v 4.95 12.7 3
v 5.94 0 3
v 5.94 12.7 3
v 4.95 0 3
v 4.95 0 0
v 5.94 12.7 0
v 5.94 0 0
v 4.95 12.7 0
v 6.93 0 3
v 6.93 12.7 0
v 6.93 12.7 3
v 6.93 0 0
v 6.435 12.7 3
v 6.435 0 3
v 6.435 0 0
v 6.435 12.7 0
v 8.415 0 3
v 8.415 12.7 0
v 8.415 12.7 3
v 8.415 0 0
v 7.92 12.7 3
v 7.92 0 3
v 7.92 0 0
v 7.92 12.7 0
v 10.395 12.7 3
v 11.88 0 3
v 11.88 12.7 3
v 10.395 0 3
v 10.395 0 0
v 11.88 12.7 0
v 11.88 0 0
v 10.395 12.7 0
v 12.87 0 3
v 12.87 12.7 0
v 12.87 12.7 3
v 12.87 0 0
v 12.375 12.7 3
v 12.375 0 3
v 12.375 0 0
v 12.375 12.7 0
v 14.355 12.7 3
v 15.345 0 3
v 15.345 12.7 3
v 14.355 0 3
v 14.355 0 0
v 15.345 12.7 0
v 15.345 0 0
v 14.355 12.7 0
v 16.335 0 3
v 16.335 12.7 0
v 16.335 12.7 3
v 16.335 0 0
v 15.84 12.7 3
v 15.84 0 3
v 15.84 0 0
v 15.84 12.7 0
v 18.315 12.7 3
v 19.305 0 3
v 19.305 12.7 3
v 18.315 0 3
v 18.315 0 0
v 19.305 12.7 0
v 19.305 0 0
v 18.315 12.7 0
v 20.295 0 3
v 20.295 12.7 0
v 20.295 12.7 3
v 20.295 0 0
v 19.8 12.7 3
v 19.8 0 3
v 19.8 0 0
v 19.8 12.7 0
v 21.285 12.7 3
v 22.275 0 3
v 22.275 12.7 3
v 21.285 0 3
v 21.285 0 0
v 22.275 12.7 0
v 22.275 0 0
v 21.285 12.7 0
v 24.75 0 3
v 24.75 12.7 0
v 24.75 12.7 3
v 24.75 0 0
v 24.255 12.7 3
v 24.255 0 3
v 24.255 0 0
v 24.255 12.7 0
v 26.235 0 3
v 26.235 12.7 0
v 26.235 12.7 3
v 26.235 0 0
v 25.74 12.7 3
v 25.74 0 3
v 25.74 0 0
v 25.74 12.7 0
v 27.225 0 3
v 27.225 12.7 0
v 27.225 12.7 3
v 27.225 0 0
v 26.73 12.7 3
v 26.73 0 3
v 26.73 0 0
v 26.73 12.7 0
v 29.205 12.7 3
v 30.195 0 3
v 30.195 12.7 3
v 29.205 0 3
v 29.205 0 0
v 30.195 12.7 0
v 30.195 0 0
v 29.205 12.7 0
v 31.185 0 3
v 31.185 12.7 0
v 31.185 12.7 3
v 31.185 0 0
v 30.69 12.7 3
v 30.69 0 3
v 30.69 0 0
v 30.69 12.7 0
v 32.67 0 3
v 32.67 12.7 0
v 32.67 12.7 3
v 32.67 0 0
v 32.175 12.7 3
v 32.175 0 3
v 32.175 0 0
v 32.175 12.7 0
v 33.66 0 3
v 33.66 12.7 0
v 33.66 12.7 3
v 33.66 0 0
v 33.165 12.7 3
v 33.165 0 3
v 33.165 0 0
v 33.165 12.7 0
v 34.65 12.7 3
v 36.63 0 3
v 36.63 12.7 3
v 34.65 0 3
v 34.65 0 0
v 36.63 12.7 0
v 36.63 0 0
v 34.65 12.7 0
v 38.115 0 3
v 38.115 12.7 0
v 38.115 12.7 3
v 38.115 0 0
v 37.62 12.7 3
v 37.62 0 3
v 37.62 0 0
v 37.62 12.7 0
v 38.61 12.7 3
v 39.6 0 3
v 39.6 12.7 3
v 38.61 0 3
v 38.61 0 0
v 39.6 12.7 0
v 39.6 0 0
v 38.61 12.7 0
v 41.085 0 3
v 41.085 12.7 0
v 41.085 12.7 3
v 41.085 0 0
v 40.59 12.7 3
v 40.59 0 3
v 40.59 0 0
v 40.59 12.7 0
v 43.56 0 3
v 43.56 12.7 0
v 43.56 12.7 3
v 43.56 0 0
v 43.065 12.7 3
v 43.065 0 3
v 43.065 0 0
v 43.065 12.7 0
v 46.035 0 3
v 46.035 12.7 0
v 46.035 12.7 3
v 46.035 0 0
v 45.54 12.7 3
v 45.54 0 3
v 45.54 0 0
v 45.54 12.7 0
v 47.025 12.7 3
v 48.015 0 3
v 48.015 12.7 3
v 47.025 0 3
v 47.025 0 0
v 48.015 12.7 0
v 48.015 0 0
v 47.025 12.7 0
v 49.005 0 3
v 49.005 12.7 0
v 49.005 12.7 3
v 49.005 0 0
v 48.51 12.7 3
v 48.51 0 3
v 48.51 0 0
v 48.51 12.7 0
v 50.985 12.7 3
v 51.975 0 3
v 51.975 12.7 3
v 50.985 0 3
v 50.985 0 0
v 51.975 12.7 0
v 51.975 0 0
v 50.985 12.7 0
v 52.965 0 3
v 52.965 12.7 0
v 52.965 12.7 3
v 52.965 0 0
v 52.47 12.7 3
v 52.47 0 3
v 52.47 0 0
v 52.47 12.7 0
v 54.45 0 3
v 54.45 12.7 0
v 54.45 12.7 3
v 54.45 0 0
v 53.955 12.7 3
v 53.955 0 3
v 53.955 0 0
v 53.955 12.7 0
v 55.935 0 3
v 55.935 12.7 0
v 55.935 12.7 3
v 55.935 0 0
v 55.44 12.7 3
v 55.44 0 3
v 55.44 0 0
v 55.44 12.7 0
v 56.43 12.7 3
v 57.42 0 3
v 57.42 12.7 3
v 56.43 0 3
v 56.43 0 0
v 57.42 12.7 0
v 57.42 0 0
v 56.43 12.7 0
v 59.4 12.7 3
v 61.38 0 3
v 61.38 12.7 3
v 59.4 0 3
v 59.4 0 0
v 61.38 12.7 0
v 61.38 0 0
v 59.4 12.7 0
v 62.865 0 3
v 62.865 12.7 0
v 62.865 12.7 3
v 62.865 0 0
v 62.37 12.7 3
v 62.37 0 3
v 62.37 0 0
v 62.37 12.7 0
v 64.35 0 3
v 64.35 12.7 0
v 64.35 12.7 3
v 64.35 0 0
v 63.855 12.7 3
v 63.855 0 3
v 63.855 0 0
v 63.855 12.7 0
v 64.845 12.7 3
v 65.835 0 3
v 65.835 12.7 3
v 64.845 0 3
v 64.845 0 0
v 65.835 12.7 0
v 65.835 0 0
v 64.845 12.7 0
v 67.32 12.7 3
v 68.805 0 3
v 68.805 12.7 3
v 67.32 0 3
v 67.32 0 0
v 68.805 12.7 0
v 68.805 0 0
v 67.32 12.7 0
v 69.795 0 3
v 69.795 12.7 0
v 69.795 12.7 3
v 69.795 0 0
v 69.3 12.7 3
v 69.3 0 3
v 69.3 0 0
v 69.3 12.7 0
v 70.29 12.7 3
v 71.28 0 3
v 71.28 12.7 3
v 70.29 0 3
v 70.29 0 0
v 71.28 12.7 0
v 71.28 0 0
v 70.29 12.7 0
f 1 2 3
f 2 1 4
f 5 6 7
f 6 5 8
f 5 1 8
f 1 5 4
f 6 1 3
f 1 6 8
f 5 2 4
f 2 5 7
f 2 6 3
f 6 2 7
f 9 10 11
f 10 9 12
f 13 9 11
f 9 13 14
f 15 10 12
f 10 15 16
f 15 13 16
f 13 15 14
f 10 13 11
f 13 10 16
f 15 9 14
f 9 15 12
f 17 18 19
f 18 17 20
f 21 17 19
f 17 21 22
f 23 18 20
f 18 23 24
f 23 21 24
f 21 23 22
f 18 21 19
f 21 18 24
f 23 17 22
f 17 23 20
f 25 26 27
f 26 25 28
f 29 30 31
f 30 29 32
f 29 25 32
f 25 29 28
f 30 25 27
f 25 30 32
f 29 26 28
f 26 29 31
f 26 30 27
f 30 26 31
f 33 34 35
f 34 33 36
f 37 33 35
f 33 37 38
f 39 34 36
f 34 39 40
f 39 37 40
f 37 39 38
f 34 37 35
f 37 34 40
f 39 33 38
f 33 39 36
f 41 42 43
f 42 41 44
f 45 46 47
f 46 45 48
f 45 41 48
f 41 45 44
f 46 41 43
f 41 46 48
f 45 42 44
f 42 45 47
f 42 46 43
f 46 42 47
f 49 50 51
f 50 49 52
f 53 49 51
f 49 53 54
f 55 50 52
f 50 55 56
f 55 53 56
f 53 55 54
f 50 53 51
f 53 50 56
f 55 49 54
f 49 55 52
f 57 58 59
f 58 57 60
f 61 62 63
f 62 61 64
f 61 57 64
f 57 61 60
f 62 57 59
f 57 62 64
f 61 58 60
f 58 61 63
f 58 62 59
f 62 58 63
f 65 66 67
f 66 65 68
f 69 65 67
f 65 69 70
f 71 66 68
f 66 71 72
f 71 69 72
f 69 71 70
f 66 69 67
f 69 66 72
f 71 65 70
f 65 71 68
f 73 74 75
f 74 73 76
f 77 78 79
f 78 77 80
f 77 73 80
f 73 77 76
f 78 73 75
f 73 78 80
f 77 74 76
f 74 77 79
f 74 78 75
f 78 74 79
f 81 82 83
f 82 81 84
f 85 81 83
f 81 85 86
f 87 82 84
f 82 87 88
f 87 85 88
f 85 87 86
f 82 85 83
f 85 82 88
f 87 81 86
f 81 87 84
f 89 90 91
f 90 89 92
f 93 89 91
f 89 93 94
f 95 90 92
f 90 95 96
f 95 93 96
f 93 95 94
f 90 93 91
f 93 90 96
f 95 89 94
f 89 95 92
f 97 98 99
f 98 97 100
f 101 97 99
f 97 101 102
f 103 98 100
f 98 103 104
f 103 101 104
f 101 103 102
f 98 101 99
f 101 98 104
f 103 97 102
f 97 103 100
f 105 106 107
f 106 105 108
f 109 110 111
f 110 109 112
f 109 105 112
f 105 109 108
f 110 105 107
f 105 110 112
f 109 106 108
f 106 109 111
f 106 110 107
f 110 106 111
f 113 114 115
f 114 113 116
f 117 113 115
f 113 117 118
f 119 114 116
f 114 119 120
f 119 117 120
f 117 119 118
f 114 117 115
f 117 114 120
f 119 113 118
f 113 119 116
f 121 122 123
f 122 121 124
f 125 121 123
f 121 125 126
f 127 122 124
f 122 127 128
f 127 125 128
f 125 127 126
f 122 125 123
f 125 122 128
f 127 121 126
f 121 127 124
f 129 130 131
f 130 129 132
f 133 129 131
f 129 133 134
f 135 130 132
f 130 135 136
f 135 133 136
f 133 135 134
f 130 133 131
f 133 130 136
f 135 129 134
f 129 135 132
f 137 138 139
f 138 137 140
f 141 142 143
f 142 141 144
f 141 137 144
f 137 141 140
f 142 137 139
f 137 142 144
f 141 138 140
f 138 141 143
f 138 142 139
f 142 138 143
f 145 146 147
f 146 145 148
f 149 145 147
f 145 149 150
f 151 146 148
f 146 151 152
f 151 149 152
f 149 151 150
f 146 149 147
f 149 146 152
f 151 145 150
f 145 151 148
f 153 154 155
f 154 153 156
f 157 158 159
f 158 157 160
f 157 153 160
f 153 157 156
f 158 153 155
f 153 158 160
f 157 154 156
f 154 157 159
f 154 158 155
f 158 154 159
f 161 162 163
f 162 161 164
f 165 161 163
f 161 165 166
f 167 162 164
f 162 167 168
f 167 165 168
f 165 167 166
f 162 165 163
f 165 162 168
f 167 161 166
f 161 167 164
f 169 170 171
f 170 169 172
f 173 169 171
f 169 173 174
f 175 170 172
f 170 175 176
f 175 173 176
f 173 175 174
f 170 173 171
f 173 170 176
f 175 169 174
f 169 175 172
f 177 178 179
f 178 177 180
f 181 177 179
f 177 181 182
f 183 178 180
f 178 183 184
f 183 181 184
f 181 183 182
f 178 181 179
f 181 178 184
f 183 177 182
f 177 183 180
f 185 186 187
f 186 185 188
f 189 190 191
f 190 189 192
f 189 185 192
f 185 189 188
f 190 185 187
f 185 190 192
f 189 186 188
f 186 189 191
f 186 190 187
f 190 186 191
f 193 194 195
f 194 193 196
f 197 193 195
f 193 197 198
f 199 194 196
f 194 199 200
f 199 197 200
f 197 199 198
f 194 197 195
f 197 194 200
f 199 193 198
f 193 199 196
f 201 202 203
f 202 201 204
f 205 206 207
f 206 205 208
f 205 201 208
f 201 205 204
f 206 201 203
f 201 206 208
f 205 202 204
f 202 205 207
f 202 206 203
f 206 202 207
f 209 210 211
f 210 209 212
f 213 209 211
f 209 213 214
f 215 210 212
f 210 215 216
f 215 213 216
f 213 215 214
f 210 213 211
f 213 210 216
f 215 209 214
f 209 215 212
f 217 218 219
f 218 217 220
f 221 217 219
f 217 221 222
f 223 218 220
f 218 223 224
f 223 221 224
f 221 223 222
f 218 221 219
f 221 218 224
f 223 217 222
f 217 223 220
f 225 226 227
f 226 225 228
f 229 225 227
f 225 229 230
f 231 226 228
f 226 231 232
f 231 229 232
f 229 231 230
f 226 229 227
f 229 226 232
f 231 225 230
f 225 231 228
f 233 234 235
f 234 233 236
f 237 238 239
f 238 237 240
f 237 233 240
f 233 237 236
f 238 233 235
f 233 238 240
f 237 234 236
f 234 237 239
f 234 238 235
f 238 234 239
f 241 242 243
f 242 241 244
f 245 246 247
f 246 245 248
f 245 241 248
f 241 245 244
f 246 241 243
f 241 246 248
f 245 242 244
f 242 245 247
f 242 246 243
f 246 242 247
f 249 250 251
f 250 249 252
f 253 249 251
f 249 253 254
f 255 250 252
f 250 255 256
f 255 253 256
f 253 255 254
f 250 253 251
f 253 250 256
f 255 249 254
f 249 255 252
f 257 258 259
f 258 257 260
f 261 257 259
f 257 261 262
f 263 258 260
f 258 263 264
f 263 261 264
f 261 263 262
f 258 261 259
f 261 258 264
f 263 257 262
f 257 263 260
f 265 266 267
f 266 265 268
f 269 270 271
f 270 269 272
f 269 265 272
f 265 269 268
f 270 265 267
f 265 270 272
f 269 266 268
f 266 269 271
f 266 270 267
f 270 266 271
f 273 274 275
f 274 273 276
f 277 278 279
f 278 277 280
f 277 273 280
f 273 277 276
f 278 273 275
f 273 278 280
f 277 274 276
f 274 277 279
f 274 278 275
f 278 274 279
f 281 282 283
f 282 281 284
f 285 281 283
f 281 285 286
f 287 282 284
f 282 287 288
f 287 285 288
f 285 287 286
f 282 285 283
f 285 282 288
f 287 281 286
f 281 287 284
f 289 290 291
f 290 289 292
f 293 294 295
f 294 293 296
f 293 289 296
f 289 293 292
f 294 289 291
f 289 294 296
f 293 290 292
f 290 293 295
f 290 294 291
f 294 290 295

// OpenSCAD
// file: ../../util/bitmap.scad
/*****************************************************************************
 * Module Bitmap Library
 * Modules to create bitmaps of unit squares from 1 or 2 dimensional vectors.
 *****************************************************************************
 * Copyright 2017 Chris Baker
 *
 * This program is free software: you can redistribute it and/or modify
 * it under the terms of the GNU Lesser General Public License as published by
 * the Free Software Foundation, either version 3 of the License, or
 * (at your option) any later version.
 *
 * This program is distributed in the hope that it will be useful,
 * but WITHOUT ANY WARRANTY; without even the implied warranty of
 * MERCHANTABILITY or FITNESS FOR A PARTICULAR PURPOSE.  See the
 * GNU Lesser General Public License for more details.
 *
 * You should have received a copy of the GNU Lesser General Public License
 * along with this program.  If not, see <http://www.gnu.org/licenses/>.
 *****************************************************************************
 * Usage:
 * Include this file with the "use" tag.
 * Depends on compat.scad library.
 *
 * API:
 *   1dbitmap(bitmap, center, expansion, vector_mode)
 *   2dbitmap(bitmap, center, expansion, vector_mode)
 *     Generate a 1 or 2-Dimensional field of modules based on the provided
 *     bitmap vector. See Bitmap Vectors below.
 *     The center flag determines whether to center the bitmap on the origin.
 *     The expansion value actually shrinks each cube in the x and y
 *     dimension by the specified amount.
 *     The vector_mode flag determines whether to create 3D solid geometry
 *     (unit cubes) or 2D vector geometry (squares).
 *
 * Bitmap Vectors:
 *   The bitmap vectors primarily provide boolean information.
 *   A module will be placed where these vectors have a postive value and
 *   skipped where they have a negative value. I.E. 0, -1, false, and undef
 *   are all equivalent and result in a skip. 1 and true are equivalent and
 *   result in a placed 1-unit module.
 *   Further, if the value is an integer it will be treated as a height for
 *   the module, allowing z-maps to be created.
 *   If the value is not an integer or boolean, it will be treated as a color
 *   reference. This can be a string or RGBA vector that will be used to
 *   color the module in the OpenSCAD preview window.
 *   In current versions of OpenSCAD, the color has no effect in the rendered
 *   view or STL output.
 *
 * Vector Mode:
 *   Although OpenSCAD supports generating 2D geometry, there are several
 *   caveats:
 *   - 2D and 3D geometry cannot be mixed
 *   - Extruding 2D geometry causes color information to be lost
 *   - All 2D geometry is projected onto the XY plane when rendering
 *   - Rendering also results in loss of color (same as 3D)
 *   - The SVG exporter is somewhat limited:
 *     - The pixel size of the image is hard-coded in the file
 *     - The title of the image is a generic string
 *     - The color selection for stroke and fill is fixed
 *     - The stroke-width is set to a large value that will cause overlap
 *     - The background is transparent
 *     - Only one path element is created with all of the geometry; there is
 *       no easy way to split up the geometry into multiple logical units.
 *     - These issues can mostly be resolved by hand-editing the file:
 *       - Remove or modify the width and height parameters from the svg
 *         element at the top of the file to provide better scaling.
 *       - Edit the title element at the top of the file to change the title.
 *       - Edit the stroke and fill parameters of the path element (these will
 *         probably be at the end of the file).
 *       - Set the stroke-width parameter for the path element to 0.
 *****************************************************************************/
use <compat.scad>

/*
 * 2dbitmap - Turn a 2D vector into a bitmap of cubes
 *
 * bitmap - 2D vector representing where to place each cube
 *          Value can either be boolean, z-height, or color
 * center - center cubes around the origin
 * expansion - size of gap around each pixel (screendoor)
 * vector_mode - create a 2D vector drawing instead of 3D extrusion
 */
module 2dbitmap(bitmap=[[1,0],[0,1]], center=false, expansion=0, vector_mode=false)
{
	ylen=len(bitmap)-1;

	for (y=[0:ylen]) {
		xlen=len(bitmap[y])-1;
		for (x=[0:xlen])
			translate([x-(center?xlen/2:0),ylen-y-(center?ylen/2:0),0])
				if (is_indexable(bitmap[y][x]))
					color(bitmap[y][x])
						if (vector_mode)
							square([1-expansion,1-expansion], center=center);
						else
							cube([1-expansion,1-expansion,1], center=center);
				else
					if (bitmap[y][x])
						if (vector_mode)
							square([1-expansion,1-expansion], center=center);
						else
							cube([1-expansion,1-expansion,clamp_nonnum(bitmap[y][x])], center=center);
	}
}

module 1dbitmap(bitmap=[1,0,1,0,1], center=false, expansion=0, vector_mode=false)
	2dbitmap([bitmap], center, expansion, vector_mode);

/*
 * Examples
 */

// 1D with z-height
translate([10,0,0]) scale([1,10,1])
	1dbitmap(bitmap=[1,1,0,2,0,0,3], expansion=.1);

// 1D with boolean
translate([-20,0,0]) scale([1,10,1])
	1dbitmap(bitmap=[true,false,true,false,true,true]);

// 2D with z-height
scale([2,2,1])
	2dbitmap(bitmap=[[1,0,2,1],[0,3,3,0],[1,1,0,1]],
		center=true);

// 1D with color
translate([0,-10,0]) scale([1,3,1])
	1dbitmap(bitmap=["red","white","blue",[0,0.3,0,0.5]]);

// 1D with color using 2D-vector-mode
translate([-7,-8,0]) scale([1,2])
	1dbitmap(bitmap=["red",0,"blue",0,"green"], vector_mode=true);
translate([-4.5,-10,0]) scale([1,2])
	1dbitmap(bitmap=["red",0,"blue",0,"green"], vector_mode=true, center=true);
// main file
/* Unit Test 08: bar=3 */
use <../code128.scad>

code_128(cs128_b("Wikipedia"), bar=3);
